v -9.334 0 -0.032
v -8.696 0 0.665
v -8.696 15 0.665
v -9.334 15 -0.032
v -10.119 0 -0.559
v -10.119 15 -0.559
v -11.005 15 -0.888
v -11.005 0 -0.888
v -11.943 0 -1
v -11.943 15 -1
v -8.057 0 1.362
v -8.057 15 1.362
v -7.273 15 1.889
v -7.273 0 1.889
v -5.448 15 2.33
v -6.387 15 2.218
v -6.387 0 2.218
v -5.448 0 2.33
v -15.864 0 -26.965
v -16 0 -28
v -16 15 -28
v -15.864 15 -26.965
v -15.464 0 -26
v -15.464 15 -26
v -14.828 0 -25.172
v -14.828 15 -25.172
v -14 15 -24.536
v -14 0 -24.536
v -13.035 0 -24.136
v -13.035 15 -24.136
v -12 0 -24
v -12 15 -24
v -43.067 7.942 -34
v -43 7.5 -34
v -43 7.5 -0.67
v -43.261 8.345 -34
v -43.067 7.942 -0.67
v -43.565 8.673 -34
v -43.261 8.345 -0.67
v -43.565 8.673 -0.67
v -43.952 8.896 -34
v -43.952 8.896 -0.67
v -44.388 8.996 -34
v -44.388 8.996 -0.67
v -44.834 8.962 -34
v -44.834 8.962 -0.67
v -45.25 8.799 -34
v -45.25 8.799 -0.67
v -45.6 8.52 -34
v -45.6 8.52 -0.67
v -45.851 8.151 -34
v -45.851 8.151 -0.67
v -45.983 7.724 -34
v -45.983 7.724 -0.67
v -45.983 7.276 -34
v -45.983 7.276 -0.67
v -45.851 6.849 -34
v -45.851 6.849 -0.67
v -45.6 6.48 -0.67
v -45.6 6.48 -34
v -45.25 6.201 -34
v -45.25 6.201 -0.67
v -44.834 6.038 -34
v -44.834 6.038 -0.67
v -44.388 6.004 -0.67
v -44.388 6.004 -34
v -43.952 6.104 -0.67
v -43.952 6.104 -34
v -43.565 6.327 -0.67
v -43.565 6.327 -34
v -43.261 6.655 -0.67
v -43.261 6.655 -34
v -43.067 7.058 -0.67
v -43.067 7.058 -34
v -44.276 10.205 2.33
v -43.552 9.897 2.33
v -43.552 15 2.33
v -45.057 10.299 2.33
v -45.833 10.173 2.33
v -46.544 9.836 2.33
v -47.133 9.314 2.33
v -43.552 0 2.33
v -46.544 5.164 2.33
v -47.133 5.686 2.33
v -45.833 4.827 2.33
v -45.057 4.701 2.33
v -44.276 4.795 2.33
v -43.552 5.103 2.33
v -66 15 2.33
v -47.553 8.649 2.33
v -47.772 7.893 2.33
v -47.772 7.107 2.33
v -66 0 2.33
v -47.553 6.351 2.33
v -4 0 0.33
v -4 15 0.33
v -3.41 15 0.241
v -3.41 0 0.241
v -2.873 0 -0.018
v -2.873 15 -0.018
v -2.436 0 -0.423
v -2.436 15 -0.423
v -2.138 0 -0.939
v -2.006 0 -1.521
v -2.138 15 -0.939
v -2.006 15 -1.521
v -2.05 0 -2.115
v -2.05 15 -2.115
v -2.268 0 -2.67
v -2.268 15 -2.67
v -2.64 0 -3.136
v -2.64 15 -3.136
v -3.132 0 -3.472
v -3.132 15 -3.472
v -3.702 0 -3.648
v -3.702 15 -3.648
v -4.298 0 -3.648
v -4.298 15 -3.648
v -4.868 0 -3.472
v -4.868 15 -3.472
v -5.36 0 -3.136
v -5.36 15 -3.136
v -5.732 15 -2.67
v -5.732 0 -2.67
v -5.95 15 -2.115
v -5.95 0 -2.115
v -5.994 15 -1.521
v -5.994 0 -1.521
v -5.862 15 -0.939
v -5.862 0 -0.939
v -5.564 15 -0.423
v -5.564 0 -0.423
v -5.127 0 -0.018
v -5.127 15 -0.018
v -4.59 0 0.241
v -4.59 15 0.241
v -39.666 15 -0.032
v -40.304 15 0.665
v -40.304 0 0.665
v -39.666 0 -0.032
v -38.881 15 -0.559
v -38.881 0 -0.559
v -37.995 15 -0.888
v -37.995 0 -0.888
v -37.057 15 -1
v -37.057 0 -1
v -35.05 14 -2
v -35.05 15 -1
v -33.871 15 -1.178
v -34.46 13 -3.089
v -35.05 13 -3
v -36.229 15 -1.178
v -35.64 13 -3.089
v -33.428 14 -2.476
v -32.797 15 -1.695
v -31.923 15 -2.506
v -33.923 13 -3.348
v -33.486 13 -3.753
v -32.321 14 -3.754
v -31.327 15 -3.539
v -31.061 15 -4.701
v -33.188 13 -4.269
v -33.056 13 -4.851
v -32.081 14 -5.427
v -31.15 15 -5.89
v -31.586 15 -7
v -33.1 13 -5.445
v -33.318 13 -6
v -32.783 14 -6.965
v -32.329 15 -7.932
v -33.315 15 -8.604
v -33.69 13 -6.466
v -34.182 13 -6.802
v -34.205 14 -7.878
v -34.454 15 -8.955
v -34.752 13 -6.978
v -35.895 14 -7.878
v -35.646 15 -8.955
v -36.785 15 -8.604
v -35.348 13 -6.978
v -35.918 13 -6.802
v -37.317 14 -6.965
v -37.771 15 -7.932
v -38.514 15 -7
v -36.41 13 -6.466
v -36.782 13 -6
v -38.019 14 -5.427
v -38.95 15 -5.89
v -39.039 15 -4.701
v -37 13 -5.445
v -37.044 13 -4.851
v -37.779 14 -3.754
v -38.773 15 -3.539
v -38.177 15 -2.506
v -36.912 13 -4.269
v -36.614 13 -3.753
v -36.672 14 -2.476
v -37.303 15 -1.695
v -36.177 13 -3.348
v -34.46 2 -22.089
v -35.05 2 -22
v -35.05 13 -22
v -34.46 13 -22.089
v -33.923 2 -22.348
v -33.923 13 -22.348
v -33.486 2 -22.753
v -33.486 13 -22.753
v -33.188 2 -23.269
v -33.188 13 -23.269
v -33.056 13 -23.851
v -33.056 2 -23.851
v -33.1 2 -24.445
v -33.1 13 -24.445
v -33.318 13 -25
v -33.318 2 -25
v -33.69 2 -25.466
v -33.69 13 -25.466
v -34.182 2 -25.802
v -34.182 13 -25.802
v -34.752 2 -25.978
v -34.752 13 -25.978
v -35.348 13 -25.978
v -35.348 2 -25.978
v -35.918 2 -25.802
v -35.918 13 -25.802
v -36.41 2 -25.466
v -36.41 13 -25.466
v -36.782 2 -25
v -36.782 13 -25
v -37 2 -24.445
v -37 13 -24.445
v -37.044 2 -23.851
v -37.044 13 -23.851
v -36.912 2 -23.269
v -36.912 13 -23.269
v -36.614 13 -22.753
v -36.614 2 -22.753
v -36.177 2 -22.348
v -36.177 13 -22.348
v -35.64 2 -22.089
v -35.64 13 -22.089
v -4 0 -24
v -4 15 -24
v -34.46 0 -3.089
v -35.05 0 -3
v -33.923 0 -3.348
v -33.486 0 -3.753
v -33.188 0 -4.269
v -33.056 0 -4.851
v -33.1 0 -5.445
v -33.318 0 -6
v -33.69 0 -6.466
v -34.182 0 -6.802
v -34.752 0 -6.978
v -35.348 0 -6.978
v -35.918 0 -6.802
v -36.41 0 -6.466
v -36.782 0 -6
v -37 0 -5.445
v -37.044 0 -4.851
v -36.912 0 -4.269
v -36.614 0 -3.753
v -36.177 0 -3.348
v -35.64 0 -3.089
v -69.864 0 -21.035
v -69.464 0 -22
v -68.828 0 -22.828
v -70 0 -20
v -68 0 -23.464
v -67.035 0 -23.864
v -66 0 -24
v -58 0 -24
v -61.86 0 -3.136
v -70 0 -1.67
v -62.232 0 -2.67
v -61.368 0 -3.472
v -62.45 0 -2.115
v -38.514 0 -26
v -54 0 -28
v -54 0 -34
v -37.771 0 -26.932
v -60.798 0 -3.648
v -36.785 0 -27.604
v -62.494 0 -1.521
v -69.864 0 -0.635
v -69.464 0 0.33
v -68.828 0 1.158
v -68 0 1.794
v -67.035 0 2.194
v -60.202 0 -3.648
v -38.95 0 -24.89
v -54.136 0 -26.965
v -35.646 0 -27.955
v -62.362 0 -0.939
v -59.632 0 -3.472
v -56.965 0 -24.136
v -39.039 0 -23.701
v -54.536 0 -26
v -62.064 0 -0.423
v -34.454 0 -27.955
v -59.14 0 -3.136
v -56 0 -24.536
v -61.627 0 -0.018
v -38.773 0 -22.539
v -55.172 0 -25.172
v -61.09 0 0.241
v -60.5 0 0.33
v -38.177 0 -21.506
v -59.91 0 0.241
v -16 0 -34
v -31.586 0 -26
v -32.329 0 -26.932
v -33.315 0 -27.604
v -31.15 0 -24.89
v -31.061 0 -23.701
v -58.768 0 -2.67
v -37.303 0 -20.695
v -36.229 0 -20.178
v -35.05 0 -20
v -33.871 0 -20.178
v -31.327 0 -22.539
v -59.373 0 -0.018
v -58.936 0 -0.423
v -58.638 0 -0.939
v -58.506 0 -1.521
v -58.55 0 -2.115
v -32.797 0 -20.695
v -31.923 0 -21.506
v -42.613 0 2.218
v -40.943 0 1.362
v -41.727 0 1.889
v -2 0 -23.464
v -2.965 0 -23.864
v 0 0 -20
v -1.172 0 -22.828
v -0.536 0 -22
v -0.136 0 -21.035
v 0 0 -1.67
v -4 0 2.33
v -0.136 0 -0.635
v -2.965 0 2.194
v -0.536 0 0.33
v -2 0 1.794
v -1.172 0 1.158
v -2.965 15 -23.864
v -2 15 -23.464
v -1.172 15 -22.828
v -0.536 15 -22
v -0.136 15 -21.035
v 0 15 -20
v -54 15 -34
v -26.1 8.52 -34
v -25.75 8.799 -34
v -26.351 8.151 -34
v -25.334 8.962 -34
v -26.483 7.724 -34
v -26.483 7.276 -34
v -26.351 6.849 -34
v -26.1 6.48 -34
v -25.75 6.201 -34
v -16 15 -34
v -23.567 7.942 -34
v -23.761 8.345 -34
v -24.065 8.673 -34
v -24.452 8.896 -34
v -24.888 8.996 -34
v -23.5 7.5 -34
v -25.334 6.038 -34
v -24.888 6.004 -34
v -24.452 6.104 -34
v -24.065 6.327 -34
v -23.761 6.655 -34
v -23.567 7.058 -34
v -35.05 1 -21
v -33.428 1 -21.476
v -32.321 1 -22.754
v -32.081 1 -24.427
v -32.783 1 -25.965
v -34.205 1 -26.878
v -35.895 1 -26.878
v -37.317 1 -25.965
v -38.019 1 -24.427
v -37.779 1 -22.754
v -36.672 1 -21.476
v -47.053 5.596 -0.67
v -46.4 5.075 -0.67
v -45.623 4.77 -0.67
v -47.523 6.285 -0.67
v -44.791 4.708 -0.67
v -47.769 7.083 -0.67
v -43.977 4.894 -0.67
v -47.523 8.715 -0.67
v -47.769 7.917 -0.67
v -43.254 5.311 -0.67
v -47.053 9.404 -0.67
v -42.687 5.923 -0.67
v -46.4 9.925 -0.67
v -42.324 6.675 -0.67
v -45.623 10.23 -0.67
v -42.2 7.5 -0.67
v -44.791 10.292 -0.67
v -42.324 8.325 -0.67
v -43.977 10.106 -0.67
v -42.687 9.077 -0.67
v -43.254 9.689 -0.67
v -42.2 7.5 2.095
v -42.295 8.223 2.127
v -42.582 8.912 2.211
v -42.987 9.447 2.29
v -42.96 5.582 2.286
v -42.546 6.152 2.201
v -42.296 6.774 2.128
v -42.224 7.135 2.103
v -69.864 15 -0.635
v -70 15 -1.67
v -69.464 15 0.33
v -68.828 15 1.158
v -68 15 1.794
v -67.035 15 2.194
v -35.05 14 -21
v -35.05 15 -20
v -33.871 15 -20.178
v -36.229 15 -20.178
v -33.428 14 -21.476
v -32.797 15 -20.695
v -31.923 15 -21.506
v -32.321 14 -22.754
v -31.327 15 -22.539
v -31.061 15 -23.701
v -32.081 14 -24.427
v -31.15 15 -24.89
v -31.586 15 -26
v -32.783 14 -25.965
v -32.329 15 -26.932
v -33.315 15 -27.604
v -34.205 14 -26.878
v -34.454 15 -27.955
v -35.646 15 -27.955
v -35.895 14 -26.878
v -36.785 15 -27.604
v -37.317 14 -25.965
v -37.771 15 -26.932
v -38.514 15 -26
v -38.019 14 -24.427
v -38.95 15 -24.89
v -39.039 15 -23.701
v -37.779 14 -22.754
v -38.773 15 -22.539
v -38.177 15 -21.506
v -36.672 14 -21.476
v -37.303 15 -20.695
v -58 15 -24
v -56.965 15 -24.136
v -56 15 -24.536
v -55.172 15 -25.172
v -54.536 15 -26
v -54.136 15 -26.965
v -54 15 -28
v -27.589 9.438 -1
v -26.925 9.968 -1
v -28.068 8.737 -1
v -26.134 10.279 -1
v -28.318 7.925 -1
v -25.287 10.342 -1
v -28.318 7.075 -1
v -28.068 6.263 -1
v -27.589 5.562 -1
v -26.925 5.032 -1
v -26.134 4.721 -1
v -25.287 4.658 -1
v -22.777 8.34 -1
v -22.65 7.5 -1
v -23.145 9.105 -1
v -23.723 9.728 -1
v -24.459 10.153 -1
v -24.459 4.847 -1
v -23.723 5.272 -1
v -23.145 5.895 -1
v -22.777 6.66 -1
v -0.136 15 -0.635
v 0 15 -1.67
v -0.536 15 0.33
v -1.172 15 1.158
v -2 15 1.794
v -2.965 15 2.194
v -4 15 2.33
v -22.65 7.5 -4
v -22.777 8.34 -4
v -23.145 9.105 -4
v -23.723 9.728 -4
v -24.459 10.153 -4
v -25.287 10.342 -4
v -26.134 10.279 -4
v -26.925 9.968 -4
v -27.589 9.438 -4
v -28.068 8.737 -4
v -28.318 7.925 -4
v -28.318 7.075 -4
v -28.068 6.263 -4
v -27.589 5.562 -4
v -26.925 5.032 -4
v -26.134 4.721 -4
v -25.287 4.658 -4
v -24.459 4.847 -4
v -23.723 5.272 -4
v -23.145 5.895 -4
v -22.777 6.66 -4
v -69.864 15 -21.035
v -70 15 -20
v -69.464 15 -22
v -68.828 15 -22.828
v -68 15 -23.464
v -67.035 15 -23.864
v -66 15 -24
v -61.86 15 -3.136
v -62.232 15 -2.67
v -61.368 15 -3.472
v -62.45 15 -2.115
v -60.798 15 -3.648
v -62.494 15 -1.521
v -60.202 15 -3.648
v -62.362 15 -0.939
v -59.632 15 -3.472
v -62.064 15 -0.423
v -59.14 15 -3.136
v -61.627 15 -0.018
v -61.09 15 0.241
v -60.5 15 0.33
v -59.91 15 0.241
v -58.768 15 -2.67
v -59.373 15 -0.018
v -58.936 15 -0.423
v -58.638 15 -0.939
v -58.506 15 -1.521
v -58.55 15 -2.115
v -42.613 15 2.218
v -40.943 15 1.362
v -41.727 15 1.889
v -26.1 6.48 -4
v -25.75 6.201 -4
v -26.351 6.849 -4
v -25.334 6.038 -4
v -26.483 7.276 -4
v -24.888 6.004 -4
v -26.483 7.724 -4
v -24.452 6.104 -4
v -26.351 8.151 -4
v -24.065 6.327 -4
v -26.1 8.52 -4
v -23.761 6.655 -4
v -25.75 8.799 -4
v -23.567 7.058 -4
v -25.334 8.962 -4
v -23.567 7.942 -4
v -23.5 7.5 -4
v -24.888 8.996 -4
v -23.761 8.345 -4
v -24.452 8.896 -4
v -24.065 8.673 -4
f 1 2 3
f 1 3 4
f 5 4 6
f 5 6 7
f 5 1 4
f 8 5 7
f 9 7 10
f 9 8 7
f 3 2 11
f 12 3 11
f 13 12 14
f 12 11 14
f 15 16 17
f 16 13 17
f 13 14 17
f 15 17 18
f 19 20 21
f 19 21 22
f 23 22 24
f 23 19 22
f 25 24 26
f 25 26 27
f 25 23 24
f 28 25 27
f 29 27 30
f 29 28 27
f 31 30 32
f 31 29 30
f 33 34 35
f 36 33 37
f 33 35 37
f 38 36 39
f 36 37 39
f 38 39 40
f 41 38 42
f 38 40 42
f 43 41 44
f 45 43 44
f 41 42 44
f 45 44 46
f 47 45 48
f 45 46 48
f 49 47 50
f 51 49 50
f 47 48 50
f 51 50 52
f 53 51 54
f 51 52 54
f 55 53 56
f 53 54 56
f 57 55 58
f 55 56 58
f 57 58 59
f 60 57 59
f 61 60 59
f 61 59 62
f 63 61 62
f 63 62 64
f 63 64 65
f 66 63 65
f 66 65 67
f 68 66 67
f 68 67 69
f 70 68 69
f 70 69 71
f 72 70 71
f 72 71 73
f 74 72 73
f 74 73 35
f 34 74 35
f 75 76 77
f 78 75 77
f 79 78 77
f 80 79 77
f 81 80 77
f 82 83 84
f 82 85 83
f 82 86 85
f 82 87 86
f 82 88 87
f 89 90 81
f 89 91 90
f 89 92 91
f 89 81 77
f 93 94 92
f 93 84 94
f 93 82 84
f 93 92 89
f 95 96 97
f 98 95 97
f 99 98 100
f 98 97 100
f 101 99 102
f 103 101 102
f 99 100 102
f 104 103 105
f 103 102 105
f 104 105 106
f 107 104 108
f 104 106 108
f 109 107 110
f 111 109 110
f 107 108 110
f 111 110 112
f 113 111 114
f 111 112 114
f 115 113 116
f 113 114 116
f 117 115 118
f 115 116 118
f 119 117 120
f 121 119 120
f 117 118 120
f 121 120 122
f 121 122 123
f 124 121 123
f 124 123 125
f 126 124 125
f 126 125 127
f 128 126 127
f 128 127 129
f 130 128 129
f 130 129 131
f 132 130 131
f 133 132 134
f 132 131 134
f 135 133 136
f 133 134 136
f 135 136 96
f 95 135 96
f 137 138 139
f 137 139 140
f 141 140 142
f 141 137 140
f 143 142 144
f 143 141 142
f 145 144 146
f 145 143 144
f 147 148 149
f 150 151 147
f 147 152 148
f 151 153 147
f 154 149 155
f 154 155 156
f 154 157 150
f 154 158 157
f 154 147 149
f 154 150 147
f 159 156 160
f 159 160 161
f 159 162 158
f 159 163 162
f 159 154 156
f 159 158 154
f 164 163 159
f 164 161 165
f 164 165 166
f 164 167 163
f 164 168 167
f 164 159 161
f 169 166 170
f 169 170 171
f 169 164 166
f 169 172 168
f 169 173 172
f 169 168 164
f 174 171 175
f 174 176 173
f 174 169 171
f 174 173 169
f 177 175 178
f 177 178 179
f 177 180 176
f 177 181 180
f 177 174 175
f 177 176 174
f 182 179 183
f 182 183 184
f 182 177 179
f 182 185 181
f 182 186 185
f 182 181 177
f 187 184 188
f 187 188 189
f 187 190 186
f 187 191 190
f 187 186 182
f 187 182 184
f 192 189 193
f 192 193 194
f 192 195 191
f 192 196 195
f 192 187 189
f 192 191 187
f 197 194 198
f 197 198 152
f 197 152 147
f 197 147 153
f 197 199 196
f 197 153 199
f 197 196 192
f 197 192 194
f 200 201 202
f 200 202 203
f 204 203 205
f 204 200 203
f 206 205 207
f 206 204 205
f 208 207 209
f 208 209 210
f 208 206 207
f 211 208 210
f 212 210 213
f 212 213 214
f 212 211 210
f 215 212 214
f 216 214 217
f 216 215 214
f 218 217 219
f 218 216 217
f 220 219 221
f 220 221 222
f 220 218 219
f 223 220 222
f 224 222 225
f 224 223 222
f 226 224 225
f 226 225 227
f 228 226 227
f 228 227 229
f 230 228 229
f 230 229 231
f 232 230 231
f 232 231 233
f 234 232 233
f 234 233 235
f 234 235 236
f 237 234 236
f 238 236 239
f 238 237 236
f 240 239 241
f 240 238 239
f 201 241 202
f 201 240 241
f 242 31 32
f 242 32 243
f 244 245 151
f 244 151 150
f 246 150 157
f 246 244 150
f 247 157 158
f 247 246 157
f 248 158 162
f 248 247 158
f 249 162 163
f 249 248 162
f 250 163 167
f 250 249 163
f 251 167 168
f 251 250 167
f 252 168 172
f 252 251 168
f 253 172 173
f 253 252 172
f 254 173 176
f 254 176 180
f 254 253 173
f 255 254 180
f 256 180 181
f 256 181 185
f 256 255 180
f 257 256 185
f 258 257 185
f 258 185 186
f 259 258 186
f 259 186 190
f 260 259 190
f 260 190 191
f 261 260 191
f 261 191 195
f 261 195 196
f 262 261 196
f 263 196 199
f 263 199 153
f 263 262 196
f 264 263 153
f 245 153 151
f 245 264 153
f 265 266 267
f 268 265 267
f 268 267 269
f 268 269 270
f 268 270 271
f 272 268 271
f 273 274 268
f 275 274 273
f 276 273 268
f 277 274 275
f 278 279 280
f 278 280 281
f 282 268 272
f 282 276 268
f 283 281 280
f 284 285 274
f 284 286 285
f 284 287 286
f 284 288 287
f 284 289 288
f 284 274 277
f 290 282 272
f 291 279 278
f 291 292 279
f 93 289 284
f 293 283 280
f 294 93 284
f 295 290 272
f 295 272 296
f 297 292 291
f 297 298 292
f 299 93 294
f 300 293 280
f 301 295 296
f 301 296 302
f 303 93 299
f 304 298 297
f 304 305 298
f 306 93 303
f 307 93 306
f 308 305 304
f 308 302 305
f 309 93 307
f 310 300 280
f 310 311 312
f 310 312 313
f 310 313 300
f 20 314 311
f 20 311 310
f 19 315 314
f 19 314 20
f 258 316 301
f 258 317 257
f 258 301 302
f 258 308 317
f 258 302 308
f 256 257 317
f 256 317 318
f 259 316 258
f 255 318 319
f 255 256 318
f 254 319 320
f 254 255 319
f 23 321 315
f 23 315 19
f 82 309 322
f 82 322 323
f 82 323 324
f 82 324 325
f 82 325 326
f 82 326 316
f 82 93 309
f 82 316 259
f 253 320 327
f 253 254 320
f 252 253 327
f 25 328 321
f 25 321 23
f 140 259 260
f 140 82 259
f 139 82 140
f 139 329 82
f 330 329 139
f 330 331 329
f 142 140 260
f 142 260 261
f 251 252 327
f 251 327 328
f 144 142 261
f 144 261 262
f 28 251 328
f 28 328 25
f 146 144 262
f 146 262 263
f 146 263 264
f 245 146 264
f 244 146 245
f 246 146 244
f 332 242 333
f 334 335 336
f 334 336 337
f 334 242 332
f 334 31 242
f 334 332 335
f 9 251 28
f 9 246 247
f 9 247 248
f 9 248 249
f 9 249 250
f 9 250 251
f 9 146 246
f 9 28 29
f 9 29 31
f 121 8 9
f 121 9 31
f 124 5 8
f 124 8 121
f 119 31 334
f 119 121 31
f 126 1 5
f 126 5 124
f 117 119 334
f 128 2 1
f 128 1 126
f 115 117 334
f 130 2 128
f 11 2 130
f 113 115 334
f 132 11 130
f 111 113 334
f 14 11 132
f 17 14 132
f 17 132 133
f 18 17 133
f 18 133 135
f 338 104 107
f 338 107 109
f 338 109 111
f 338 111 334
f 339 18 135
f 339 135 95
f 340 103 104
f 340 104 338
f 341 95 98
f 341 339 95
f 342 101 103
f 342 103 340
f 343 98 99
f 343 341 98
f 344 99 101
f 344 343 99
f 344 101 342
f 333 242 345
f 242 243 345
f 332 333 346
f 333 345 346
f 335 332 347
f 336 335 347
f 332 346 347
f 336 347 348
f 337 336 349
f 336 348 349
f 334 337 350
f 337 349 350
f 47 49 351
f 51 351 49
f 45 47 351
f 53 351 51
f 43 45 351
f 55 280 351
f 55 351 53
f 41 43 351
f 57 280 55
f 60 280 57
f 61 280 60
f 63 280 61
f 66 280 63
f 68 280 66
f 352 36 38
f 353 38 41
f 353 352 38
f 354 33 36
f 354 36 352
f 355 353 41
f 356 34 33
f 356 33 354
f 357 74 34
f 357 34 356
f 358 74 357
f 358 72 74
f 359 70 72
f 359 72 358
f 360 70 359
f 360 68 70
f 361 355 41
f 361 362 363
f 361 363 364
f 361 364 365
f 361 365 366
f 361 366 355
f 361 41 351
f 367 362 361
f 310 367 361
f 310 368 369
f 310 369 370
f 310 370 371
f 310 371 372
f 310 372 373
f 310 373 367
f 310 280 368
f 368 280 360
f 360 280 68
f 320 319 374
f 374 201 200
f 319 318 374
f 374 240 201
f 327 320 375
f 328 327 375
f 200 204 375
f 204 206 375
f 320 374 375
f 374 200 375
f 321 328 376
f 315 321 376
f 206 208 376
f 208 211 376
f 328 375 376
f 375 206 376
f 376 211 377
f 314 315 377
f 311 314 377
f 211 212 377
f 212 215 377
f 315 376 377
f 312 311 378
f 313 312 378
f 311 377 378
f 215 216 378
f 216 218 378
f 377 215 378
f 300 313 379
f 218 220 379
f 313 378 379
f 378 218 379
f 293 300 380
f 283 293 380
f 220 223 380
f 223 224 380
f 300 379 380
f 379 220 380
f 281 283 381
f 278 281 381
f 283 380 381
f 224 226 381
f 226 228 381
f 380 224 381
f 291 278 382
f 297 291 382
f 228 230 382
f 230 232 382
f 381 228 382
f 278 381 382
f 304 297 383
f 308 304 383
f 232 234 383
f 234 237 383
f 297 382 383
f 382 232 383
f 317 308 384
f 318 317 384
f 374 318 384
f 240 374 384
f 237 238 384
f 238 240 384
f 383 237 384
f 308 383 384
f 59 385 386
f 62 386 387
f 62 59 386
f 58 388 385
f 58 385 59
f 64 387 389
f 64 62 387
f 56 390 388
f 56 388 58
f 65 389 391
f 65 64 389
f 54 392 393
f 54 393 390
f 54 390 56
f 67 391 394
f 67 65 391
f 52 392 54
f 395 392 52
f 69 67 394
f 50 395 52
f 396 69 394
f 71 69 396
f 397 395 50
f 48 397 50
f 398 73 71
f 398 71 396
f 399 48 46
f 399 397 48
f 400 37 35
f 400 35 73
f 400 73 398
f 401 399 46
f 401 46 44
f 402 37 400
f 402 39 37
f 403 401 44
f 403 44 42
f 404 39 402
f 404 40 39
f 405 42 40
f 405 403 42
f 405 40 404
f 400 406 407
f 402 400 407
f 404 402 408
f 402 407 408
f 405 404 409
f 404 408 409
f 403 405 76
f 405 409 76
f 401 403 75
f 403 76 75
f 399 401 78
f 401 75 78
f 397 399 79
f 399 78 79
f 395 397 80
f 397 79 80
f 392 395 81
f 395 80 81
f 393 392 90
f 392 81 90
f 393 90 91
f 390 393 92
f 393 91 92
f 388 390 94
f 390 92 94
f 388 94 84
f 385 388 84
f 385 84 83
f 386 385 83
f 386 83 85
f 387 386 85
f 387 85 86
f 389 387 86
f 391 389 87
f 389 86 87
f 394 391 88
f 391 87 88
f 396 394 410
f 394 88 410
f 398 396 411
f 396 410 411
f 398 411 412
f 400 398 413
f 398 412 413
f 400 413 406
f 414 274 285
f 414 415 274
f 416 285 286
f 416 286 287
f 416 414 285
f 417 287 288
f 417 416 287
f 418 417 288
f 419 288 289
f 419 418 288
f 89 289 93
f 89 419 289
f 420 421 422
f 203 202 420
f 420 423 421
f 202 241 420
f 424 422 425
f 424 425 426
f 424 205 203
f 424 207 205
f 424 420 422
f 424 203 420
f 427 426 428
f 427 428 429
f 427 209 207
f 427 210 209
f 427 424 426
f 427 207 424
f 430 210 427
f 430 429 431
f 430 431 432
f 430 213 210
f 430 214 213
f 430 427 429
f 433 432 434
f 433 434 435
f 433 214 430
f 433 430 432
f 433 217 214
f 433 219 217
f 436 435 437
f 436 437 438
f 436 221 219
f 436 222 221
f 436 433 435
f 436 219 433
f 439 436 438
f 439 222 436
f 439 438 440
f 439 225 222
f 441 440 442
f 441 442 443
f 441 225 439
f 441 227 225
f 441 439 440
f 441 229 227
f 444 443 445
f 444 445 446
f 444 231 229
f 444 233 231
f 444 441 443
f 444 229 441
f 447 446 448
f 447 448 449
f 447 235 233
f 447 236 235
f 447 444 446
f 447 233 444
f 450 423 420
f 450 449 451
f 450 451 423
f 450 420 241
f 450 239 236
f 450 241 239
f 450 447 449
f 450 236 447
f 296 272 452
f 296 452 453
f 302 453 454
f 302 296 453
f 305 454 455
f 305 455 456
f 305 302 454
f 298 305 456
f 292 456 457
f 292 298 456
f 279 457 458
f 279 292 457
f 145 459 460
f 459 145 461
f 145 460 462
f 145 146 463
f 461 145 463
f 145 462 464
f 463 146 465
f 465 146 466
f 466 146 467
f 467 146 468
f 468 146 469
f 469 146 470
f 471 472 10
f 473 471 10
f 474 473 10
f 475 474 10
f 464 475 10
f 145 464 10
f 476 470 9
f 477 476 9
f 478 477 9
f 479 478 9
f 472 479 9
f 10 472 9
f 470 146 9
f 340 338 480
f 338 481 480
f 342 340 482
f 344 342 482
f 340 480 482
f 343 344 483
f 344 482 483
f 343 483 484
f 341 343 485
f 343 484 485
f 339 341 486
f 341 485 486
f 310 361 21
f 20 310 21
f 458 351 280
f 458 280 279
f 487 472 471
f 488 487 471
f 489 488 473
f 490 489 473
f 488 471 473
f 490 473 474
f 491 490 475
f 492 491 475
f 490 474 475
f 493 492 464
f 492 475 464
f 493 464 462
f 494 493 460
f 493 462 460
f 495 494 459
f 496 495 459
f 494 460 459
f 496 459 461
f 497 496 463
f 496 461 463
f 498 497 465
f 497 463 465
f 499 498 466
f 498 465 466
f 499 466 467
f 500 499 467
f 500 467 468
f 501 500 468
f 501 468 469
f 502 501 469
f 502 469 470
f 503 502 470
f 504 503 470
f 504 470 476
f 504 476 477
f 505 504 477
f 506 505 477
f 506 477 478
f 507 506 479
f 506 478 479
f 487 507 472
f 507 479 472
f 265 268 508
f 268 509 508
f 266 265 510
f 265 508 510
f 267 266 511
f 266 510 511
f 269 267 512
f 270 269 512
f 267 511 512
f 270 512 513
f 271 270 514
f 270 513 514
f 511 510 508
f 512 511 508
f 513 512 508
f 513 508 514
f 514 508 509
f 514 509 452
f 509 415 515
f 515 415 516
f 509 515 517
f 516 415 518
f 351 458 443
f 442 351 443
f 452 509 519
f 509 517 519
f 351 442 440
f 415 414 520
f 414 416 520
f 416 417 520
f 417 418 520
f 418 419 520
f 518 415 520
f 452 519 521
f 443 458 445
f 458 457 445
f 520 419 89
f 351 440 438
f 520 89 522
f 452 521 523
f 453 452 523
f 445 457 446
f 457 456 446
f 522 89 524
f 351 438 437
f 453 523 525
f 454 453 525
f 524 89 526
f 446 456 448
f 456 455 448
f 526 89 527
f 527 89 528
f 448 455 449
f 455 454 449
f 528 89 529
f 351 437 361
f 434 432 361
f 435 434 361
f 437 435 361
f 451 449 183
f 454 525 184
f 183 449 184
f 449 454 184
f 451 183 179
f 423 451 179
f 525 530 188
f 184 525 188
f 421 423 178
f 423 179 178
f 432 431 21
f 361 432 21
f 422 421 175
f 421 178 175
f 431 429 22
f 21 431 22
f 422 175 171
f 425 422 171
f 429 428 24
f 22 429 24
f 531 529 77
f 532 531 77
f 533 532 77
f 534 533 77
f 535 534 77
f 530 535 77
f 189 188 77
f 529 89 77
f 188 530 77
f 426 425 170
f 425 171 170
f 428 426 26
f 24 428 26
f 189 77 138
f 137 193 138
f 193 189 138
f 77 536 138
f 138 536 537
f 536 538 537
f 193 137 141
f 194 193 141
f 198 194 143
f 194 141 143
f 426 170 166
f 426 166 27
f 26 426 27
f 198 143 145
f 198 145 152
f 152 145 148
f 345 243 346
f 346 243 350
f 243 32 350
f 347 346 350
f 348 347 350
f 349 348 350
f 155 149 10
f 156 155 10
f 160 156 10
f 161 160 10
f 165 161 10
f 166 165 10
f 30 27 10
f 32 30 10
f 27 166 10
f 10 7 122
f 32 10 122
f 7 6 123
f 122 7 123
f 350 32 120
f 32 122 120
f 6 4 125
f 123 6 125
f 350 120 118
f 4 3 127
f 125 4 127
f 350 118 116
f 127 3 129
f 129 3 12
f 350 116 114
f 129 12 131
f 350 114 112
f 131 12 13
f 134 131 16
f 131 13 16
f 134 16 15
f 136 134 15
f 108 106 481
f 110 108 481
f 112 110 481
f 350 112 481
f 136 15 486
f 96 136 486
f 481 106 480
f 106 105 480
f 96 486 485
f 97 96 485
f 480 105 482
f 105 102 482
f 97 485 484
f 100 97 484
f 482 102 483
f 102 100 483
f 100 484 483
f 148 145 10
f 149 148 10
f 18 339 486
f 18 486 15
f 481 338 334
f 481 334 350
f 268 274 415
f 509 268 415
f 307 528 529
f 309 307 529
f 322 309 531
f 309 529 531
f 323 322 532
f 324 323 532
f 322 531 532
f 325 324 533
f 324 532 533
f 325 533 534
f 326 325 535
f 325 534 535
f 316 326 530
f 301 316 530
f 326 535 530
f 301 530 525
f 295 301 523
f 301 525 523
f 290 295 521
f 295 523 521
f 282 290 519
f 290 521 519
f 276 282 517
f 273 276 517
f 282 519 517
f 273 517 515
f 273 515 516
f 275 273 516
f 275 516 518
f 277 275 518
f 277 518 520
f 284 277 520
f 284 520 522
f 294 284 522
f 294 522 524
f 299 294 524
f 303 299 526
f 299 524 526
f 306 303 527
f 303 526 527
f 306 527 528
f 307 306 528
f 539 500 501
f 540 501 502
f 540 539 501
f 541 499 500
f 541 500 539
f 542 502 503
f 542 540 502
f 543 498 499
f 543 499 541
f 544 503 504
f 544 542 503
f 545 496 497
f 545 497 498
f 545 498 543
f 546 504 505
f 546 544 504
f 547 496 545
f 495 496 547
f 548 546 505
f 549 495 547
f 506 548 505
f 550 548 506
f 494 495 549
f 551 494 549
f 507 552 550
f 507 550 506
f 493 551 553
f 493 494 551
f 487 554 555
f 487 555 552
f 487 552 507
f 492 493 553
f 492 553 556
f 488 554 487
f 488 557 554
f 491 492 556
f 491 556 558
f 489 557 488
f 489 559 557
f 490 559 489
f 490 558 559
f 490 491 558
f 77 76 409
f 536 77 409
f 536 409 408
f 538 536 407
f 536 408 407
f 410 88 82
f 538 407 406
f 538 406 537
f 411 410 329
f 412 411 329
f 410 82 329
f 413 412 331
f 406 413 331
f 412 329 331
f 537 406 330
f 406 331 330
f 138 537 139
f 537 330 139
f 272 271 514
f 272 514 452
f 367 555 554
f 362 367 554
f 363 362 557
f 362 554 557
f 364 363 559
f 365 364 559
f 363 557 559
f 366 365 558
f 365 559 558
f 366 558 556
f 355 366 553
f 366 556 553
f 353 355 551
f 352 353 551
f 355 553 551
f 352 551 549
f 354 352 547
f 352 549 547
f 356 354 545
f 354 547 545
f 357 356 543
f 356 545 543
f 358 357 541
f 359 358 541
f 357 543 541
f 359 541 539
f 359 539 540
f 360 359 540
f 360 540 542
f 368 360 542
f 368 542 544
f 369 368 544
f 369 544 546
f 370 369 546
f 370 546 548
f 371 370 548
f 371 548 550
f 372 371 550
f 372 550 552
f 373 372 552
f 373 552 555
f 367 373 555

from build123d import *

# Parameters (mm, degrees)
SKETCH1_W           = 70
SKETCH1_H           = 34
SKETCH1_R           = 2
BOSS_EXTRUDE1_DEPTH = 15
SKETCH6_W           = 70
SKETCH6_H           = 15
BOSS_EXTRUDE2_DEPTH = 5
SKETCH3_R           = 2
CUT_EXTRUDE2_DEPTH  = 15
SKETCH8_W           = 6
SKETCH8_H           = 5
CUT_EXTRUDE3_DEPTH  = 15
SKETCH9_W           = 12
SKETCH9_H           = 6
CUT_EXTRUDE4_DEPTH  = 15
SKETCH10_W          = 16
SKETCH10_H          = 10
CUT_EXTRUDE5_DEPTH  = 17
SKETCH12_R          = 1.5
CUT_EXTRUDE6_DEPTH  = 41
SKETCH13_W          = 27.5
SKETCH13_H          = 6
CUT_EXTRUDE7_DEPTH  = 20
SKETCH14_W          = 13.5
SKETCH14_H          = 2.67
SKETCH14_W_2        = 29
CUT_EXTRUDE8_DEPTH  = 17
FILLET2_R           = 4
SKETCH16_W          = 5.5
SKETCH16_H          = 3.33
CUT_EXTRUDE10_DEPTH = 18
FILLET4_R           = 4
FILLET5_R           = 4
SKETCH17_R          = 2.85
CUT_EXTRUDE11_DEPTH = 3
SKETCH18_R          = 2.8
CUT_EXTRUDE12_DEPTH = 3
CHAMFER1_SIZE       = 2


# Some blends are built 0.0001 mm under size
with BuildPart() as part:
    # Sketch1 → Boss-Extrude1 (new body)
    with BuildSketch(Plane(origin=(0, 0, 0), x_dir=(1, 0, 0), z_dir=(0, 1, 0))):
        with Locations((-35, 17)):
            Rectangle(SKETCH1_W, SKETCH1_H)
        with Locations(Location((-35.05, 24, 0), (0, 0, 270))):
            Circle(SKETCH1_R, mode=Mode.SUBTRACT)
        with Locations(Location((-35.05, 5, 0), (0, 0, 270))):
            Circle(SKETCH1_R, mode=Mode.SUBTRACT)
    extrude(amount=BOSS_EXTRUDE1_DEPTH)

    # Sketch6 → Boss-Extrude2 (add)
    with BuildSketch(Plane.XY):
        with Locations((-35, 7.5)):
            Rectangle(SKETCH6_W, SKETCH6_H)
    extrude(amount=BOSS_EXTRUDE2_DEPTH)

    # Sketch3 → Cut-Extrude2 (cut)
    with BuildSketch(Plane(origin=(0, 15, 0), x_dir=(1, 0, 0), z_dir=(0, 1, 0))):
        with Locations(Location((-4, 1.67, 0), (0, 0, 270))):
            Circle(SKETCH3_R)
        with Locations(Location((-60.5, 1.67, 0), (0, 0, 270))):
            Circle(SKETCH3_R)
    extrude(amount=-CUT_EXTRUDE2_DEPTH, mode=Mode.SUBTRACT)

    # Sketch8 → Cut-Extrude3 (cut)
    with BuildSketch(Plane(origin=(0, 15, 0), x_dir=(1, 0, 0), z_dir=(0, 1, 0))):
        with Locations((-16.5, -2.5)):
            Rectangle(SKETCH8_W, SKETCH8_H)
    extrude(amount=-CUT_EXTRUDE3_DEPTH, mode=Mode.SUBTRACT)

    # Sketch9 → Cut-Extrude4 (cut)
    with BuildSketch(Plane(origin=(0, 15, 0), x_dir=(1, 0, 0), z_dir=(0, 1, 0))):
        with Locations((-35, -2)):
            Rectangle(SKETCH9_W, SKETCH9_H)
    extrude(amount=-CUT_EXTRUDE4_DEPTH, mode=Mode.SUBTRACT)

    # Sketch10 → Cut-Extrude5 (cut)
    with BuildSketch(Plane.XZ):
        with Locations((-8, -29)):
            Rectangle(SKETCH10_W, SKETCH10_H)
        with Locations((-62, -29)):
            Rectangle(SKETCH10_W, SKETCH10_H)
    extrude(amount=-CUT_EXTRUDE5_DEPTH, mode=Mode.SUBTRACT)

    # Sketch12 → Cut-Extrude6 (cut)
    with BuildSketch(Plane.XY.offset(5)):
        with Locations((-44.5, 7.5)):
            Circle(SKETCH12_R)
        with Locations((-25, 7.499999999)):
            Circle(SKETCH12_R)
    extrude(amount=-CUT_EXTRUDE6_DEPTH, mode=Mode.SUBTRACT)

    # Sketch13 → Cut-Extrude7 (cut)
    with BuildSketch(Plane(origin=(0, 15, 0), x_dir=(1, 0, 0), z_dir=(0, 1, 0))):
        with Locations((-27.25, -2)):
            Rectangle(SKETCH13_W, SKETCH13_H)
    extrude(amount=-CUT_EXTRUDE7_DEPTH, mode=Mode.SUBTRACT)

    # Sketch14 → Cut-Extrude8 (cut)
    with BuildSketch(Plane(origin=(0, 0, 0), x_dir=(-1, 0, 0), z_dir=(0, -1, 0))):
        with Locations((6.75, -3.665)):
            Rectangle(SKETCH14_W, SKETCH14_H)
        with Locations((55.5, -3.665)):
            Rectangle(SKETCH14_W_2, SKETCH14_H)
    extrude(amount=-CUT_EXTRUDE8_DEPTH, mode=Mode.SUBTRACT)

    # Fillet2
    fillet2_edges = [part.edges().sort_by_distance(p)[0] for p in [
        (0, 7.5, 2.33),
        (-70, 7.5, 2.33),
        (-70, 7.5, -24),
        (0, 7.5, -24),
    ]]
    fillet(fillet2_edges, radius=FILLET2_R)

    # Sketch16 → Cut-Extrude10 (cut)
    with BuildSketch(Plane.XZ):
        with Locations((-10.75, 0.665)):
            Rectangle(SKETCH16_W, SKETCH16_H)
    extrude(amount=-CUT_EXTRUDE10_DEPTH, mode=Mode.SUBTRACT)

    # Fillet4
    # the kernel refuses this fillet: 4 mm, written as the material it adds along each edge
    with BuildSketch(Plane(origin=(-16, 0, -24), x_dir=(1, 0, 0), z_dir=(0, 1, 0)), Plane(origin=(-54, 0, -24), x_dir=(0, 0, -1), z_dir=(0, 1, 0))) as fillet4_piece_1:
        with BuildLine():
            CenterArc((FILLET4_R, FILLET4_R), FILLET4_R, 180, 90)
            Line((0, FILLET4_R), (-FILLET4_R * 0.02, FILLET4_R))
            Line((-FILLET4_R * 0.02, FILLET4_R), (-FILLET4_R * 0.02, -FILLET4_R * 0.02))
            Line((-FILLET4_R * 0.02, -FILLET4_R * 0.02), (FILLET4_R, -FILLET4_R * 0.02))
            Line((FILLET4_R, -FILLET4_R * 0.02), (FILLET4_R, 0))
        make_face()
    extrude(amount=15)
    with BuildSketch(Plane(origin=(-41, 15, -1), x_dir=(0, 0, 1), z_dir=(0, -1, 0))) as fillet4_piece_2:
        with BuildLine():
            CenterArc((4, -3.943488304), FILLET4_R, 99.642495459, 80.357504541)
            Line((0, -3.943488304), (-0.08, -3.943488304))
            Line((-0.08, -3.943488304), (-0.08, 0))
            Line((-0.08, 0), (0, 0.08))
            ThreePointArc((0, 0.08), (1.665, 0.08), (3.3166, 0.078869766))
            Line((3.3166, 0.078869766), (3.33, 0))
        make_face()
    extrude(amount=15)
    with BuildSketch(Plane(origin=(-8, 0, -1), x_dir=(-1.0, 0, -8.691057696161095e-11), z_dir=(0, 1, 0))) as fillet4_piece_3:
        with BuildLine():
            CenterArc((3.943488303, 4), FILLET4_R, 189.642495464, 80.357504541)
            Line((0, 3.33), (-0.078869766, 3.3166))
            ThreePointArc((-0.078869766, 3.3166), (-0.08, 1.665), (-0.08, 0))
            Line((-0.08, 0), (0, -0.08))
            Line((0, -0.08), (3.943488304, -0.08))
            Line((3.943488304, -0.08), (3.943488304, 0))
        make_face()
    extrude(amount=15)

    # Fillet5
    # the kernel refuses this fillet: 4 mm, written as the material it takes off along each edge
    with BuildSketch(Plane(origin=(-41, -6.379948368, 2.33), x_dir=(0.3855616700587326, 0, -0.922682067985241), z_dir=(0, 1, 0))) as fillet5_piece_1:
        with BuildLine():
            CenterArc((2.706782853, 3.896912262), FILLET5_R, 202.67861385, 54.285267758)
            Line((-0.983945419, 2.354665582), (0, 0))
            ThreePointArc((0, 0), (0.902260951, 0.103087738), (1.804521902, 0))
        make_face()
    extrude(amount=27.759896736, mode=Mode.SUBTRACT)
    with BuildSketch(Plane(origin=(-8, -6.379948368, 2.33), x_dir=(-0.38556167005872005, 0, -0.9226820679852463), z_dir=(0, 1, 0))) as fillet5_piece_2:
        with BuildLine():
            CenterArc((2.706782853, -3.896912262), FILLET5_R, 103.036118392, 54.285267758)
            Line((-0.983945419, -2.354665582), (0, 0))
            ThreePointArc((0, 0), (0.902260951, -0.103087738), (1.804521902, 0))
        make_face()
    extrude(amount=27.759896736, mode=Mode.SUBTRACT)

    # Sketch17 → Cut-Extrude11 (cut)
    with BuildSketch(Plane.XY.offset(-1)):
        with Locations((-25.499999999, 7.499999999)):
            Circle(SKETCH17_R)
    extrude(amount=-CUT_EXTRUDE11_DEPTH, mode=Mode.SUBTRACT)

    # Sketch18 → Cut-Extrude12 (cut)
    with BuildSketch(Plane.XY.offset(2.33)):
        with Locations((-45, 7.5)):
            Circle(SKETCH18_R)
    extrude(amount=-CUT_EXTRUDE12_DEPTH, mode=Mode.SUBTRACT)

    # Chamfer1
    chamfer1_edges = [part.edges().sort_by_distance(p)[0] for p in [
        (-35.05, 0, -26),
        (-35.05, 15, -26),
        (-35.05, 15, -7),
    ]]
    chamfer(chamfer1_edges, length=CHAMFER1_SIZE - 0.0001)  # a hair under: the kernel refuses the full size


solid = part.part
